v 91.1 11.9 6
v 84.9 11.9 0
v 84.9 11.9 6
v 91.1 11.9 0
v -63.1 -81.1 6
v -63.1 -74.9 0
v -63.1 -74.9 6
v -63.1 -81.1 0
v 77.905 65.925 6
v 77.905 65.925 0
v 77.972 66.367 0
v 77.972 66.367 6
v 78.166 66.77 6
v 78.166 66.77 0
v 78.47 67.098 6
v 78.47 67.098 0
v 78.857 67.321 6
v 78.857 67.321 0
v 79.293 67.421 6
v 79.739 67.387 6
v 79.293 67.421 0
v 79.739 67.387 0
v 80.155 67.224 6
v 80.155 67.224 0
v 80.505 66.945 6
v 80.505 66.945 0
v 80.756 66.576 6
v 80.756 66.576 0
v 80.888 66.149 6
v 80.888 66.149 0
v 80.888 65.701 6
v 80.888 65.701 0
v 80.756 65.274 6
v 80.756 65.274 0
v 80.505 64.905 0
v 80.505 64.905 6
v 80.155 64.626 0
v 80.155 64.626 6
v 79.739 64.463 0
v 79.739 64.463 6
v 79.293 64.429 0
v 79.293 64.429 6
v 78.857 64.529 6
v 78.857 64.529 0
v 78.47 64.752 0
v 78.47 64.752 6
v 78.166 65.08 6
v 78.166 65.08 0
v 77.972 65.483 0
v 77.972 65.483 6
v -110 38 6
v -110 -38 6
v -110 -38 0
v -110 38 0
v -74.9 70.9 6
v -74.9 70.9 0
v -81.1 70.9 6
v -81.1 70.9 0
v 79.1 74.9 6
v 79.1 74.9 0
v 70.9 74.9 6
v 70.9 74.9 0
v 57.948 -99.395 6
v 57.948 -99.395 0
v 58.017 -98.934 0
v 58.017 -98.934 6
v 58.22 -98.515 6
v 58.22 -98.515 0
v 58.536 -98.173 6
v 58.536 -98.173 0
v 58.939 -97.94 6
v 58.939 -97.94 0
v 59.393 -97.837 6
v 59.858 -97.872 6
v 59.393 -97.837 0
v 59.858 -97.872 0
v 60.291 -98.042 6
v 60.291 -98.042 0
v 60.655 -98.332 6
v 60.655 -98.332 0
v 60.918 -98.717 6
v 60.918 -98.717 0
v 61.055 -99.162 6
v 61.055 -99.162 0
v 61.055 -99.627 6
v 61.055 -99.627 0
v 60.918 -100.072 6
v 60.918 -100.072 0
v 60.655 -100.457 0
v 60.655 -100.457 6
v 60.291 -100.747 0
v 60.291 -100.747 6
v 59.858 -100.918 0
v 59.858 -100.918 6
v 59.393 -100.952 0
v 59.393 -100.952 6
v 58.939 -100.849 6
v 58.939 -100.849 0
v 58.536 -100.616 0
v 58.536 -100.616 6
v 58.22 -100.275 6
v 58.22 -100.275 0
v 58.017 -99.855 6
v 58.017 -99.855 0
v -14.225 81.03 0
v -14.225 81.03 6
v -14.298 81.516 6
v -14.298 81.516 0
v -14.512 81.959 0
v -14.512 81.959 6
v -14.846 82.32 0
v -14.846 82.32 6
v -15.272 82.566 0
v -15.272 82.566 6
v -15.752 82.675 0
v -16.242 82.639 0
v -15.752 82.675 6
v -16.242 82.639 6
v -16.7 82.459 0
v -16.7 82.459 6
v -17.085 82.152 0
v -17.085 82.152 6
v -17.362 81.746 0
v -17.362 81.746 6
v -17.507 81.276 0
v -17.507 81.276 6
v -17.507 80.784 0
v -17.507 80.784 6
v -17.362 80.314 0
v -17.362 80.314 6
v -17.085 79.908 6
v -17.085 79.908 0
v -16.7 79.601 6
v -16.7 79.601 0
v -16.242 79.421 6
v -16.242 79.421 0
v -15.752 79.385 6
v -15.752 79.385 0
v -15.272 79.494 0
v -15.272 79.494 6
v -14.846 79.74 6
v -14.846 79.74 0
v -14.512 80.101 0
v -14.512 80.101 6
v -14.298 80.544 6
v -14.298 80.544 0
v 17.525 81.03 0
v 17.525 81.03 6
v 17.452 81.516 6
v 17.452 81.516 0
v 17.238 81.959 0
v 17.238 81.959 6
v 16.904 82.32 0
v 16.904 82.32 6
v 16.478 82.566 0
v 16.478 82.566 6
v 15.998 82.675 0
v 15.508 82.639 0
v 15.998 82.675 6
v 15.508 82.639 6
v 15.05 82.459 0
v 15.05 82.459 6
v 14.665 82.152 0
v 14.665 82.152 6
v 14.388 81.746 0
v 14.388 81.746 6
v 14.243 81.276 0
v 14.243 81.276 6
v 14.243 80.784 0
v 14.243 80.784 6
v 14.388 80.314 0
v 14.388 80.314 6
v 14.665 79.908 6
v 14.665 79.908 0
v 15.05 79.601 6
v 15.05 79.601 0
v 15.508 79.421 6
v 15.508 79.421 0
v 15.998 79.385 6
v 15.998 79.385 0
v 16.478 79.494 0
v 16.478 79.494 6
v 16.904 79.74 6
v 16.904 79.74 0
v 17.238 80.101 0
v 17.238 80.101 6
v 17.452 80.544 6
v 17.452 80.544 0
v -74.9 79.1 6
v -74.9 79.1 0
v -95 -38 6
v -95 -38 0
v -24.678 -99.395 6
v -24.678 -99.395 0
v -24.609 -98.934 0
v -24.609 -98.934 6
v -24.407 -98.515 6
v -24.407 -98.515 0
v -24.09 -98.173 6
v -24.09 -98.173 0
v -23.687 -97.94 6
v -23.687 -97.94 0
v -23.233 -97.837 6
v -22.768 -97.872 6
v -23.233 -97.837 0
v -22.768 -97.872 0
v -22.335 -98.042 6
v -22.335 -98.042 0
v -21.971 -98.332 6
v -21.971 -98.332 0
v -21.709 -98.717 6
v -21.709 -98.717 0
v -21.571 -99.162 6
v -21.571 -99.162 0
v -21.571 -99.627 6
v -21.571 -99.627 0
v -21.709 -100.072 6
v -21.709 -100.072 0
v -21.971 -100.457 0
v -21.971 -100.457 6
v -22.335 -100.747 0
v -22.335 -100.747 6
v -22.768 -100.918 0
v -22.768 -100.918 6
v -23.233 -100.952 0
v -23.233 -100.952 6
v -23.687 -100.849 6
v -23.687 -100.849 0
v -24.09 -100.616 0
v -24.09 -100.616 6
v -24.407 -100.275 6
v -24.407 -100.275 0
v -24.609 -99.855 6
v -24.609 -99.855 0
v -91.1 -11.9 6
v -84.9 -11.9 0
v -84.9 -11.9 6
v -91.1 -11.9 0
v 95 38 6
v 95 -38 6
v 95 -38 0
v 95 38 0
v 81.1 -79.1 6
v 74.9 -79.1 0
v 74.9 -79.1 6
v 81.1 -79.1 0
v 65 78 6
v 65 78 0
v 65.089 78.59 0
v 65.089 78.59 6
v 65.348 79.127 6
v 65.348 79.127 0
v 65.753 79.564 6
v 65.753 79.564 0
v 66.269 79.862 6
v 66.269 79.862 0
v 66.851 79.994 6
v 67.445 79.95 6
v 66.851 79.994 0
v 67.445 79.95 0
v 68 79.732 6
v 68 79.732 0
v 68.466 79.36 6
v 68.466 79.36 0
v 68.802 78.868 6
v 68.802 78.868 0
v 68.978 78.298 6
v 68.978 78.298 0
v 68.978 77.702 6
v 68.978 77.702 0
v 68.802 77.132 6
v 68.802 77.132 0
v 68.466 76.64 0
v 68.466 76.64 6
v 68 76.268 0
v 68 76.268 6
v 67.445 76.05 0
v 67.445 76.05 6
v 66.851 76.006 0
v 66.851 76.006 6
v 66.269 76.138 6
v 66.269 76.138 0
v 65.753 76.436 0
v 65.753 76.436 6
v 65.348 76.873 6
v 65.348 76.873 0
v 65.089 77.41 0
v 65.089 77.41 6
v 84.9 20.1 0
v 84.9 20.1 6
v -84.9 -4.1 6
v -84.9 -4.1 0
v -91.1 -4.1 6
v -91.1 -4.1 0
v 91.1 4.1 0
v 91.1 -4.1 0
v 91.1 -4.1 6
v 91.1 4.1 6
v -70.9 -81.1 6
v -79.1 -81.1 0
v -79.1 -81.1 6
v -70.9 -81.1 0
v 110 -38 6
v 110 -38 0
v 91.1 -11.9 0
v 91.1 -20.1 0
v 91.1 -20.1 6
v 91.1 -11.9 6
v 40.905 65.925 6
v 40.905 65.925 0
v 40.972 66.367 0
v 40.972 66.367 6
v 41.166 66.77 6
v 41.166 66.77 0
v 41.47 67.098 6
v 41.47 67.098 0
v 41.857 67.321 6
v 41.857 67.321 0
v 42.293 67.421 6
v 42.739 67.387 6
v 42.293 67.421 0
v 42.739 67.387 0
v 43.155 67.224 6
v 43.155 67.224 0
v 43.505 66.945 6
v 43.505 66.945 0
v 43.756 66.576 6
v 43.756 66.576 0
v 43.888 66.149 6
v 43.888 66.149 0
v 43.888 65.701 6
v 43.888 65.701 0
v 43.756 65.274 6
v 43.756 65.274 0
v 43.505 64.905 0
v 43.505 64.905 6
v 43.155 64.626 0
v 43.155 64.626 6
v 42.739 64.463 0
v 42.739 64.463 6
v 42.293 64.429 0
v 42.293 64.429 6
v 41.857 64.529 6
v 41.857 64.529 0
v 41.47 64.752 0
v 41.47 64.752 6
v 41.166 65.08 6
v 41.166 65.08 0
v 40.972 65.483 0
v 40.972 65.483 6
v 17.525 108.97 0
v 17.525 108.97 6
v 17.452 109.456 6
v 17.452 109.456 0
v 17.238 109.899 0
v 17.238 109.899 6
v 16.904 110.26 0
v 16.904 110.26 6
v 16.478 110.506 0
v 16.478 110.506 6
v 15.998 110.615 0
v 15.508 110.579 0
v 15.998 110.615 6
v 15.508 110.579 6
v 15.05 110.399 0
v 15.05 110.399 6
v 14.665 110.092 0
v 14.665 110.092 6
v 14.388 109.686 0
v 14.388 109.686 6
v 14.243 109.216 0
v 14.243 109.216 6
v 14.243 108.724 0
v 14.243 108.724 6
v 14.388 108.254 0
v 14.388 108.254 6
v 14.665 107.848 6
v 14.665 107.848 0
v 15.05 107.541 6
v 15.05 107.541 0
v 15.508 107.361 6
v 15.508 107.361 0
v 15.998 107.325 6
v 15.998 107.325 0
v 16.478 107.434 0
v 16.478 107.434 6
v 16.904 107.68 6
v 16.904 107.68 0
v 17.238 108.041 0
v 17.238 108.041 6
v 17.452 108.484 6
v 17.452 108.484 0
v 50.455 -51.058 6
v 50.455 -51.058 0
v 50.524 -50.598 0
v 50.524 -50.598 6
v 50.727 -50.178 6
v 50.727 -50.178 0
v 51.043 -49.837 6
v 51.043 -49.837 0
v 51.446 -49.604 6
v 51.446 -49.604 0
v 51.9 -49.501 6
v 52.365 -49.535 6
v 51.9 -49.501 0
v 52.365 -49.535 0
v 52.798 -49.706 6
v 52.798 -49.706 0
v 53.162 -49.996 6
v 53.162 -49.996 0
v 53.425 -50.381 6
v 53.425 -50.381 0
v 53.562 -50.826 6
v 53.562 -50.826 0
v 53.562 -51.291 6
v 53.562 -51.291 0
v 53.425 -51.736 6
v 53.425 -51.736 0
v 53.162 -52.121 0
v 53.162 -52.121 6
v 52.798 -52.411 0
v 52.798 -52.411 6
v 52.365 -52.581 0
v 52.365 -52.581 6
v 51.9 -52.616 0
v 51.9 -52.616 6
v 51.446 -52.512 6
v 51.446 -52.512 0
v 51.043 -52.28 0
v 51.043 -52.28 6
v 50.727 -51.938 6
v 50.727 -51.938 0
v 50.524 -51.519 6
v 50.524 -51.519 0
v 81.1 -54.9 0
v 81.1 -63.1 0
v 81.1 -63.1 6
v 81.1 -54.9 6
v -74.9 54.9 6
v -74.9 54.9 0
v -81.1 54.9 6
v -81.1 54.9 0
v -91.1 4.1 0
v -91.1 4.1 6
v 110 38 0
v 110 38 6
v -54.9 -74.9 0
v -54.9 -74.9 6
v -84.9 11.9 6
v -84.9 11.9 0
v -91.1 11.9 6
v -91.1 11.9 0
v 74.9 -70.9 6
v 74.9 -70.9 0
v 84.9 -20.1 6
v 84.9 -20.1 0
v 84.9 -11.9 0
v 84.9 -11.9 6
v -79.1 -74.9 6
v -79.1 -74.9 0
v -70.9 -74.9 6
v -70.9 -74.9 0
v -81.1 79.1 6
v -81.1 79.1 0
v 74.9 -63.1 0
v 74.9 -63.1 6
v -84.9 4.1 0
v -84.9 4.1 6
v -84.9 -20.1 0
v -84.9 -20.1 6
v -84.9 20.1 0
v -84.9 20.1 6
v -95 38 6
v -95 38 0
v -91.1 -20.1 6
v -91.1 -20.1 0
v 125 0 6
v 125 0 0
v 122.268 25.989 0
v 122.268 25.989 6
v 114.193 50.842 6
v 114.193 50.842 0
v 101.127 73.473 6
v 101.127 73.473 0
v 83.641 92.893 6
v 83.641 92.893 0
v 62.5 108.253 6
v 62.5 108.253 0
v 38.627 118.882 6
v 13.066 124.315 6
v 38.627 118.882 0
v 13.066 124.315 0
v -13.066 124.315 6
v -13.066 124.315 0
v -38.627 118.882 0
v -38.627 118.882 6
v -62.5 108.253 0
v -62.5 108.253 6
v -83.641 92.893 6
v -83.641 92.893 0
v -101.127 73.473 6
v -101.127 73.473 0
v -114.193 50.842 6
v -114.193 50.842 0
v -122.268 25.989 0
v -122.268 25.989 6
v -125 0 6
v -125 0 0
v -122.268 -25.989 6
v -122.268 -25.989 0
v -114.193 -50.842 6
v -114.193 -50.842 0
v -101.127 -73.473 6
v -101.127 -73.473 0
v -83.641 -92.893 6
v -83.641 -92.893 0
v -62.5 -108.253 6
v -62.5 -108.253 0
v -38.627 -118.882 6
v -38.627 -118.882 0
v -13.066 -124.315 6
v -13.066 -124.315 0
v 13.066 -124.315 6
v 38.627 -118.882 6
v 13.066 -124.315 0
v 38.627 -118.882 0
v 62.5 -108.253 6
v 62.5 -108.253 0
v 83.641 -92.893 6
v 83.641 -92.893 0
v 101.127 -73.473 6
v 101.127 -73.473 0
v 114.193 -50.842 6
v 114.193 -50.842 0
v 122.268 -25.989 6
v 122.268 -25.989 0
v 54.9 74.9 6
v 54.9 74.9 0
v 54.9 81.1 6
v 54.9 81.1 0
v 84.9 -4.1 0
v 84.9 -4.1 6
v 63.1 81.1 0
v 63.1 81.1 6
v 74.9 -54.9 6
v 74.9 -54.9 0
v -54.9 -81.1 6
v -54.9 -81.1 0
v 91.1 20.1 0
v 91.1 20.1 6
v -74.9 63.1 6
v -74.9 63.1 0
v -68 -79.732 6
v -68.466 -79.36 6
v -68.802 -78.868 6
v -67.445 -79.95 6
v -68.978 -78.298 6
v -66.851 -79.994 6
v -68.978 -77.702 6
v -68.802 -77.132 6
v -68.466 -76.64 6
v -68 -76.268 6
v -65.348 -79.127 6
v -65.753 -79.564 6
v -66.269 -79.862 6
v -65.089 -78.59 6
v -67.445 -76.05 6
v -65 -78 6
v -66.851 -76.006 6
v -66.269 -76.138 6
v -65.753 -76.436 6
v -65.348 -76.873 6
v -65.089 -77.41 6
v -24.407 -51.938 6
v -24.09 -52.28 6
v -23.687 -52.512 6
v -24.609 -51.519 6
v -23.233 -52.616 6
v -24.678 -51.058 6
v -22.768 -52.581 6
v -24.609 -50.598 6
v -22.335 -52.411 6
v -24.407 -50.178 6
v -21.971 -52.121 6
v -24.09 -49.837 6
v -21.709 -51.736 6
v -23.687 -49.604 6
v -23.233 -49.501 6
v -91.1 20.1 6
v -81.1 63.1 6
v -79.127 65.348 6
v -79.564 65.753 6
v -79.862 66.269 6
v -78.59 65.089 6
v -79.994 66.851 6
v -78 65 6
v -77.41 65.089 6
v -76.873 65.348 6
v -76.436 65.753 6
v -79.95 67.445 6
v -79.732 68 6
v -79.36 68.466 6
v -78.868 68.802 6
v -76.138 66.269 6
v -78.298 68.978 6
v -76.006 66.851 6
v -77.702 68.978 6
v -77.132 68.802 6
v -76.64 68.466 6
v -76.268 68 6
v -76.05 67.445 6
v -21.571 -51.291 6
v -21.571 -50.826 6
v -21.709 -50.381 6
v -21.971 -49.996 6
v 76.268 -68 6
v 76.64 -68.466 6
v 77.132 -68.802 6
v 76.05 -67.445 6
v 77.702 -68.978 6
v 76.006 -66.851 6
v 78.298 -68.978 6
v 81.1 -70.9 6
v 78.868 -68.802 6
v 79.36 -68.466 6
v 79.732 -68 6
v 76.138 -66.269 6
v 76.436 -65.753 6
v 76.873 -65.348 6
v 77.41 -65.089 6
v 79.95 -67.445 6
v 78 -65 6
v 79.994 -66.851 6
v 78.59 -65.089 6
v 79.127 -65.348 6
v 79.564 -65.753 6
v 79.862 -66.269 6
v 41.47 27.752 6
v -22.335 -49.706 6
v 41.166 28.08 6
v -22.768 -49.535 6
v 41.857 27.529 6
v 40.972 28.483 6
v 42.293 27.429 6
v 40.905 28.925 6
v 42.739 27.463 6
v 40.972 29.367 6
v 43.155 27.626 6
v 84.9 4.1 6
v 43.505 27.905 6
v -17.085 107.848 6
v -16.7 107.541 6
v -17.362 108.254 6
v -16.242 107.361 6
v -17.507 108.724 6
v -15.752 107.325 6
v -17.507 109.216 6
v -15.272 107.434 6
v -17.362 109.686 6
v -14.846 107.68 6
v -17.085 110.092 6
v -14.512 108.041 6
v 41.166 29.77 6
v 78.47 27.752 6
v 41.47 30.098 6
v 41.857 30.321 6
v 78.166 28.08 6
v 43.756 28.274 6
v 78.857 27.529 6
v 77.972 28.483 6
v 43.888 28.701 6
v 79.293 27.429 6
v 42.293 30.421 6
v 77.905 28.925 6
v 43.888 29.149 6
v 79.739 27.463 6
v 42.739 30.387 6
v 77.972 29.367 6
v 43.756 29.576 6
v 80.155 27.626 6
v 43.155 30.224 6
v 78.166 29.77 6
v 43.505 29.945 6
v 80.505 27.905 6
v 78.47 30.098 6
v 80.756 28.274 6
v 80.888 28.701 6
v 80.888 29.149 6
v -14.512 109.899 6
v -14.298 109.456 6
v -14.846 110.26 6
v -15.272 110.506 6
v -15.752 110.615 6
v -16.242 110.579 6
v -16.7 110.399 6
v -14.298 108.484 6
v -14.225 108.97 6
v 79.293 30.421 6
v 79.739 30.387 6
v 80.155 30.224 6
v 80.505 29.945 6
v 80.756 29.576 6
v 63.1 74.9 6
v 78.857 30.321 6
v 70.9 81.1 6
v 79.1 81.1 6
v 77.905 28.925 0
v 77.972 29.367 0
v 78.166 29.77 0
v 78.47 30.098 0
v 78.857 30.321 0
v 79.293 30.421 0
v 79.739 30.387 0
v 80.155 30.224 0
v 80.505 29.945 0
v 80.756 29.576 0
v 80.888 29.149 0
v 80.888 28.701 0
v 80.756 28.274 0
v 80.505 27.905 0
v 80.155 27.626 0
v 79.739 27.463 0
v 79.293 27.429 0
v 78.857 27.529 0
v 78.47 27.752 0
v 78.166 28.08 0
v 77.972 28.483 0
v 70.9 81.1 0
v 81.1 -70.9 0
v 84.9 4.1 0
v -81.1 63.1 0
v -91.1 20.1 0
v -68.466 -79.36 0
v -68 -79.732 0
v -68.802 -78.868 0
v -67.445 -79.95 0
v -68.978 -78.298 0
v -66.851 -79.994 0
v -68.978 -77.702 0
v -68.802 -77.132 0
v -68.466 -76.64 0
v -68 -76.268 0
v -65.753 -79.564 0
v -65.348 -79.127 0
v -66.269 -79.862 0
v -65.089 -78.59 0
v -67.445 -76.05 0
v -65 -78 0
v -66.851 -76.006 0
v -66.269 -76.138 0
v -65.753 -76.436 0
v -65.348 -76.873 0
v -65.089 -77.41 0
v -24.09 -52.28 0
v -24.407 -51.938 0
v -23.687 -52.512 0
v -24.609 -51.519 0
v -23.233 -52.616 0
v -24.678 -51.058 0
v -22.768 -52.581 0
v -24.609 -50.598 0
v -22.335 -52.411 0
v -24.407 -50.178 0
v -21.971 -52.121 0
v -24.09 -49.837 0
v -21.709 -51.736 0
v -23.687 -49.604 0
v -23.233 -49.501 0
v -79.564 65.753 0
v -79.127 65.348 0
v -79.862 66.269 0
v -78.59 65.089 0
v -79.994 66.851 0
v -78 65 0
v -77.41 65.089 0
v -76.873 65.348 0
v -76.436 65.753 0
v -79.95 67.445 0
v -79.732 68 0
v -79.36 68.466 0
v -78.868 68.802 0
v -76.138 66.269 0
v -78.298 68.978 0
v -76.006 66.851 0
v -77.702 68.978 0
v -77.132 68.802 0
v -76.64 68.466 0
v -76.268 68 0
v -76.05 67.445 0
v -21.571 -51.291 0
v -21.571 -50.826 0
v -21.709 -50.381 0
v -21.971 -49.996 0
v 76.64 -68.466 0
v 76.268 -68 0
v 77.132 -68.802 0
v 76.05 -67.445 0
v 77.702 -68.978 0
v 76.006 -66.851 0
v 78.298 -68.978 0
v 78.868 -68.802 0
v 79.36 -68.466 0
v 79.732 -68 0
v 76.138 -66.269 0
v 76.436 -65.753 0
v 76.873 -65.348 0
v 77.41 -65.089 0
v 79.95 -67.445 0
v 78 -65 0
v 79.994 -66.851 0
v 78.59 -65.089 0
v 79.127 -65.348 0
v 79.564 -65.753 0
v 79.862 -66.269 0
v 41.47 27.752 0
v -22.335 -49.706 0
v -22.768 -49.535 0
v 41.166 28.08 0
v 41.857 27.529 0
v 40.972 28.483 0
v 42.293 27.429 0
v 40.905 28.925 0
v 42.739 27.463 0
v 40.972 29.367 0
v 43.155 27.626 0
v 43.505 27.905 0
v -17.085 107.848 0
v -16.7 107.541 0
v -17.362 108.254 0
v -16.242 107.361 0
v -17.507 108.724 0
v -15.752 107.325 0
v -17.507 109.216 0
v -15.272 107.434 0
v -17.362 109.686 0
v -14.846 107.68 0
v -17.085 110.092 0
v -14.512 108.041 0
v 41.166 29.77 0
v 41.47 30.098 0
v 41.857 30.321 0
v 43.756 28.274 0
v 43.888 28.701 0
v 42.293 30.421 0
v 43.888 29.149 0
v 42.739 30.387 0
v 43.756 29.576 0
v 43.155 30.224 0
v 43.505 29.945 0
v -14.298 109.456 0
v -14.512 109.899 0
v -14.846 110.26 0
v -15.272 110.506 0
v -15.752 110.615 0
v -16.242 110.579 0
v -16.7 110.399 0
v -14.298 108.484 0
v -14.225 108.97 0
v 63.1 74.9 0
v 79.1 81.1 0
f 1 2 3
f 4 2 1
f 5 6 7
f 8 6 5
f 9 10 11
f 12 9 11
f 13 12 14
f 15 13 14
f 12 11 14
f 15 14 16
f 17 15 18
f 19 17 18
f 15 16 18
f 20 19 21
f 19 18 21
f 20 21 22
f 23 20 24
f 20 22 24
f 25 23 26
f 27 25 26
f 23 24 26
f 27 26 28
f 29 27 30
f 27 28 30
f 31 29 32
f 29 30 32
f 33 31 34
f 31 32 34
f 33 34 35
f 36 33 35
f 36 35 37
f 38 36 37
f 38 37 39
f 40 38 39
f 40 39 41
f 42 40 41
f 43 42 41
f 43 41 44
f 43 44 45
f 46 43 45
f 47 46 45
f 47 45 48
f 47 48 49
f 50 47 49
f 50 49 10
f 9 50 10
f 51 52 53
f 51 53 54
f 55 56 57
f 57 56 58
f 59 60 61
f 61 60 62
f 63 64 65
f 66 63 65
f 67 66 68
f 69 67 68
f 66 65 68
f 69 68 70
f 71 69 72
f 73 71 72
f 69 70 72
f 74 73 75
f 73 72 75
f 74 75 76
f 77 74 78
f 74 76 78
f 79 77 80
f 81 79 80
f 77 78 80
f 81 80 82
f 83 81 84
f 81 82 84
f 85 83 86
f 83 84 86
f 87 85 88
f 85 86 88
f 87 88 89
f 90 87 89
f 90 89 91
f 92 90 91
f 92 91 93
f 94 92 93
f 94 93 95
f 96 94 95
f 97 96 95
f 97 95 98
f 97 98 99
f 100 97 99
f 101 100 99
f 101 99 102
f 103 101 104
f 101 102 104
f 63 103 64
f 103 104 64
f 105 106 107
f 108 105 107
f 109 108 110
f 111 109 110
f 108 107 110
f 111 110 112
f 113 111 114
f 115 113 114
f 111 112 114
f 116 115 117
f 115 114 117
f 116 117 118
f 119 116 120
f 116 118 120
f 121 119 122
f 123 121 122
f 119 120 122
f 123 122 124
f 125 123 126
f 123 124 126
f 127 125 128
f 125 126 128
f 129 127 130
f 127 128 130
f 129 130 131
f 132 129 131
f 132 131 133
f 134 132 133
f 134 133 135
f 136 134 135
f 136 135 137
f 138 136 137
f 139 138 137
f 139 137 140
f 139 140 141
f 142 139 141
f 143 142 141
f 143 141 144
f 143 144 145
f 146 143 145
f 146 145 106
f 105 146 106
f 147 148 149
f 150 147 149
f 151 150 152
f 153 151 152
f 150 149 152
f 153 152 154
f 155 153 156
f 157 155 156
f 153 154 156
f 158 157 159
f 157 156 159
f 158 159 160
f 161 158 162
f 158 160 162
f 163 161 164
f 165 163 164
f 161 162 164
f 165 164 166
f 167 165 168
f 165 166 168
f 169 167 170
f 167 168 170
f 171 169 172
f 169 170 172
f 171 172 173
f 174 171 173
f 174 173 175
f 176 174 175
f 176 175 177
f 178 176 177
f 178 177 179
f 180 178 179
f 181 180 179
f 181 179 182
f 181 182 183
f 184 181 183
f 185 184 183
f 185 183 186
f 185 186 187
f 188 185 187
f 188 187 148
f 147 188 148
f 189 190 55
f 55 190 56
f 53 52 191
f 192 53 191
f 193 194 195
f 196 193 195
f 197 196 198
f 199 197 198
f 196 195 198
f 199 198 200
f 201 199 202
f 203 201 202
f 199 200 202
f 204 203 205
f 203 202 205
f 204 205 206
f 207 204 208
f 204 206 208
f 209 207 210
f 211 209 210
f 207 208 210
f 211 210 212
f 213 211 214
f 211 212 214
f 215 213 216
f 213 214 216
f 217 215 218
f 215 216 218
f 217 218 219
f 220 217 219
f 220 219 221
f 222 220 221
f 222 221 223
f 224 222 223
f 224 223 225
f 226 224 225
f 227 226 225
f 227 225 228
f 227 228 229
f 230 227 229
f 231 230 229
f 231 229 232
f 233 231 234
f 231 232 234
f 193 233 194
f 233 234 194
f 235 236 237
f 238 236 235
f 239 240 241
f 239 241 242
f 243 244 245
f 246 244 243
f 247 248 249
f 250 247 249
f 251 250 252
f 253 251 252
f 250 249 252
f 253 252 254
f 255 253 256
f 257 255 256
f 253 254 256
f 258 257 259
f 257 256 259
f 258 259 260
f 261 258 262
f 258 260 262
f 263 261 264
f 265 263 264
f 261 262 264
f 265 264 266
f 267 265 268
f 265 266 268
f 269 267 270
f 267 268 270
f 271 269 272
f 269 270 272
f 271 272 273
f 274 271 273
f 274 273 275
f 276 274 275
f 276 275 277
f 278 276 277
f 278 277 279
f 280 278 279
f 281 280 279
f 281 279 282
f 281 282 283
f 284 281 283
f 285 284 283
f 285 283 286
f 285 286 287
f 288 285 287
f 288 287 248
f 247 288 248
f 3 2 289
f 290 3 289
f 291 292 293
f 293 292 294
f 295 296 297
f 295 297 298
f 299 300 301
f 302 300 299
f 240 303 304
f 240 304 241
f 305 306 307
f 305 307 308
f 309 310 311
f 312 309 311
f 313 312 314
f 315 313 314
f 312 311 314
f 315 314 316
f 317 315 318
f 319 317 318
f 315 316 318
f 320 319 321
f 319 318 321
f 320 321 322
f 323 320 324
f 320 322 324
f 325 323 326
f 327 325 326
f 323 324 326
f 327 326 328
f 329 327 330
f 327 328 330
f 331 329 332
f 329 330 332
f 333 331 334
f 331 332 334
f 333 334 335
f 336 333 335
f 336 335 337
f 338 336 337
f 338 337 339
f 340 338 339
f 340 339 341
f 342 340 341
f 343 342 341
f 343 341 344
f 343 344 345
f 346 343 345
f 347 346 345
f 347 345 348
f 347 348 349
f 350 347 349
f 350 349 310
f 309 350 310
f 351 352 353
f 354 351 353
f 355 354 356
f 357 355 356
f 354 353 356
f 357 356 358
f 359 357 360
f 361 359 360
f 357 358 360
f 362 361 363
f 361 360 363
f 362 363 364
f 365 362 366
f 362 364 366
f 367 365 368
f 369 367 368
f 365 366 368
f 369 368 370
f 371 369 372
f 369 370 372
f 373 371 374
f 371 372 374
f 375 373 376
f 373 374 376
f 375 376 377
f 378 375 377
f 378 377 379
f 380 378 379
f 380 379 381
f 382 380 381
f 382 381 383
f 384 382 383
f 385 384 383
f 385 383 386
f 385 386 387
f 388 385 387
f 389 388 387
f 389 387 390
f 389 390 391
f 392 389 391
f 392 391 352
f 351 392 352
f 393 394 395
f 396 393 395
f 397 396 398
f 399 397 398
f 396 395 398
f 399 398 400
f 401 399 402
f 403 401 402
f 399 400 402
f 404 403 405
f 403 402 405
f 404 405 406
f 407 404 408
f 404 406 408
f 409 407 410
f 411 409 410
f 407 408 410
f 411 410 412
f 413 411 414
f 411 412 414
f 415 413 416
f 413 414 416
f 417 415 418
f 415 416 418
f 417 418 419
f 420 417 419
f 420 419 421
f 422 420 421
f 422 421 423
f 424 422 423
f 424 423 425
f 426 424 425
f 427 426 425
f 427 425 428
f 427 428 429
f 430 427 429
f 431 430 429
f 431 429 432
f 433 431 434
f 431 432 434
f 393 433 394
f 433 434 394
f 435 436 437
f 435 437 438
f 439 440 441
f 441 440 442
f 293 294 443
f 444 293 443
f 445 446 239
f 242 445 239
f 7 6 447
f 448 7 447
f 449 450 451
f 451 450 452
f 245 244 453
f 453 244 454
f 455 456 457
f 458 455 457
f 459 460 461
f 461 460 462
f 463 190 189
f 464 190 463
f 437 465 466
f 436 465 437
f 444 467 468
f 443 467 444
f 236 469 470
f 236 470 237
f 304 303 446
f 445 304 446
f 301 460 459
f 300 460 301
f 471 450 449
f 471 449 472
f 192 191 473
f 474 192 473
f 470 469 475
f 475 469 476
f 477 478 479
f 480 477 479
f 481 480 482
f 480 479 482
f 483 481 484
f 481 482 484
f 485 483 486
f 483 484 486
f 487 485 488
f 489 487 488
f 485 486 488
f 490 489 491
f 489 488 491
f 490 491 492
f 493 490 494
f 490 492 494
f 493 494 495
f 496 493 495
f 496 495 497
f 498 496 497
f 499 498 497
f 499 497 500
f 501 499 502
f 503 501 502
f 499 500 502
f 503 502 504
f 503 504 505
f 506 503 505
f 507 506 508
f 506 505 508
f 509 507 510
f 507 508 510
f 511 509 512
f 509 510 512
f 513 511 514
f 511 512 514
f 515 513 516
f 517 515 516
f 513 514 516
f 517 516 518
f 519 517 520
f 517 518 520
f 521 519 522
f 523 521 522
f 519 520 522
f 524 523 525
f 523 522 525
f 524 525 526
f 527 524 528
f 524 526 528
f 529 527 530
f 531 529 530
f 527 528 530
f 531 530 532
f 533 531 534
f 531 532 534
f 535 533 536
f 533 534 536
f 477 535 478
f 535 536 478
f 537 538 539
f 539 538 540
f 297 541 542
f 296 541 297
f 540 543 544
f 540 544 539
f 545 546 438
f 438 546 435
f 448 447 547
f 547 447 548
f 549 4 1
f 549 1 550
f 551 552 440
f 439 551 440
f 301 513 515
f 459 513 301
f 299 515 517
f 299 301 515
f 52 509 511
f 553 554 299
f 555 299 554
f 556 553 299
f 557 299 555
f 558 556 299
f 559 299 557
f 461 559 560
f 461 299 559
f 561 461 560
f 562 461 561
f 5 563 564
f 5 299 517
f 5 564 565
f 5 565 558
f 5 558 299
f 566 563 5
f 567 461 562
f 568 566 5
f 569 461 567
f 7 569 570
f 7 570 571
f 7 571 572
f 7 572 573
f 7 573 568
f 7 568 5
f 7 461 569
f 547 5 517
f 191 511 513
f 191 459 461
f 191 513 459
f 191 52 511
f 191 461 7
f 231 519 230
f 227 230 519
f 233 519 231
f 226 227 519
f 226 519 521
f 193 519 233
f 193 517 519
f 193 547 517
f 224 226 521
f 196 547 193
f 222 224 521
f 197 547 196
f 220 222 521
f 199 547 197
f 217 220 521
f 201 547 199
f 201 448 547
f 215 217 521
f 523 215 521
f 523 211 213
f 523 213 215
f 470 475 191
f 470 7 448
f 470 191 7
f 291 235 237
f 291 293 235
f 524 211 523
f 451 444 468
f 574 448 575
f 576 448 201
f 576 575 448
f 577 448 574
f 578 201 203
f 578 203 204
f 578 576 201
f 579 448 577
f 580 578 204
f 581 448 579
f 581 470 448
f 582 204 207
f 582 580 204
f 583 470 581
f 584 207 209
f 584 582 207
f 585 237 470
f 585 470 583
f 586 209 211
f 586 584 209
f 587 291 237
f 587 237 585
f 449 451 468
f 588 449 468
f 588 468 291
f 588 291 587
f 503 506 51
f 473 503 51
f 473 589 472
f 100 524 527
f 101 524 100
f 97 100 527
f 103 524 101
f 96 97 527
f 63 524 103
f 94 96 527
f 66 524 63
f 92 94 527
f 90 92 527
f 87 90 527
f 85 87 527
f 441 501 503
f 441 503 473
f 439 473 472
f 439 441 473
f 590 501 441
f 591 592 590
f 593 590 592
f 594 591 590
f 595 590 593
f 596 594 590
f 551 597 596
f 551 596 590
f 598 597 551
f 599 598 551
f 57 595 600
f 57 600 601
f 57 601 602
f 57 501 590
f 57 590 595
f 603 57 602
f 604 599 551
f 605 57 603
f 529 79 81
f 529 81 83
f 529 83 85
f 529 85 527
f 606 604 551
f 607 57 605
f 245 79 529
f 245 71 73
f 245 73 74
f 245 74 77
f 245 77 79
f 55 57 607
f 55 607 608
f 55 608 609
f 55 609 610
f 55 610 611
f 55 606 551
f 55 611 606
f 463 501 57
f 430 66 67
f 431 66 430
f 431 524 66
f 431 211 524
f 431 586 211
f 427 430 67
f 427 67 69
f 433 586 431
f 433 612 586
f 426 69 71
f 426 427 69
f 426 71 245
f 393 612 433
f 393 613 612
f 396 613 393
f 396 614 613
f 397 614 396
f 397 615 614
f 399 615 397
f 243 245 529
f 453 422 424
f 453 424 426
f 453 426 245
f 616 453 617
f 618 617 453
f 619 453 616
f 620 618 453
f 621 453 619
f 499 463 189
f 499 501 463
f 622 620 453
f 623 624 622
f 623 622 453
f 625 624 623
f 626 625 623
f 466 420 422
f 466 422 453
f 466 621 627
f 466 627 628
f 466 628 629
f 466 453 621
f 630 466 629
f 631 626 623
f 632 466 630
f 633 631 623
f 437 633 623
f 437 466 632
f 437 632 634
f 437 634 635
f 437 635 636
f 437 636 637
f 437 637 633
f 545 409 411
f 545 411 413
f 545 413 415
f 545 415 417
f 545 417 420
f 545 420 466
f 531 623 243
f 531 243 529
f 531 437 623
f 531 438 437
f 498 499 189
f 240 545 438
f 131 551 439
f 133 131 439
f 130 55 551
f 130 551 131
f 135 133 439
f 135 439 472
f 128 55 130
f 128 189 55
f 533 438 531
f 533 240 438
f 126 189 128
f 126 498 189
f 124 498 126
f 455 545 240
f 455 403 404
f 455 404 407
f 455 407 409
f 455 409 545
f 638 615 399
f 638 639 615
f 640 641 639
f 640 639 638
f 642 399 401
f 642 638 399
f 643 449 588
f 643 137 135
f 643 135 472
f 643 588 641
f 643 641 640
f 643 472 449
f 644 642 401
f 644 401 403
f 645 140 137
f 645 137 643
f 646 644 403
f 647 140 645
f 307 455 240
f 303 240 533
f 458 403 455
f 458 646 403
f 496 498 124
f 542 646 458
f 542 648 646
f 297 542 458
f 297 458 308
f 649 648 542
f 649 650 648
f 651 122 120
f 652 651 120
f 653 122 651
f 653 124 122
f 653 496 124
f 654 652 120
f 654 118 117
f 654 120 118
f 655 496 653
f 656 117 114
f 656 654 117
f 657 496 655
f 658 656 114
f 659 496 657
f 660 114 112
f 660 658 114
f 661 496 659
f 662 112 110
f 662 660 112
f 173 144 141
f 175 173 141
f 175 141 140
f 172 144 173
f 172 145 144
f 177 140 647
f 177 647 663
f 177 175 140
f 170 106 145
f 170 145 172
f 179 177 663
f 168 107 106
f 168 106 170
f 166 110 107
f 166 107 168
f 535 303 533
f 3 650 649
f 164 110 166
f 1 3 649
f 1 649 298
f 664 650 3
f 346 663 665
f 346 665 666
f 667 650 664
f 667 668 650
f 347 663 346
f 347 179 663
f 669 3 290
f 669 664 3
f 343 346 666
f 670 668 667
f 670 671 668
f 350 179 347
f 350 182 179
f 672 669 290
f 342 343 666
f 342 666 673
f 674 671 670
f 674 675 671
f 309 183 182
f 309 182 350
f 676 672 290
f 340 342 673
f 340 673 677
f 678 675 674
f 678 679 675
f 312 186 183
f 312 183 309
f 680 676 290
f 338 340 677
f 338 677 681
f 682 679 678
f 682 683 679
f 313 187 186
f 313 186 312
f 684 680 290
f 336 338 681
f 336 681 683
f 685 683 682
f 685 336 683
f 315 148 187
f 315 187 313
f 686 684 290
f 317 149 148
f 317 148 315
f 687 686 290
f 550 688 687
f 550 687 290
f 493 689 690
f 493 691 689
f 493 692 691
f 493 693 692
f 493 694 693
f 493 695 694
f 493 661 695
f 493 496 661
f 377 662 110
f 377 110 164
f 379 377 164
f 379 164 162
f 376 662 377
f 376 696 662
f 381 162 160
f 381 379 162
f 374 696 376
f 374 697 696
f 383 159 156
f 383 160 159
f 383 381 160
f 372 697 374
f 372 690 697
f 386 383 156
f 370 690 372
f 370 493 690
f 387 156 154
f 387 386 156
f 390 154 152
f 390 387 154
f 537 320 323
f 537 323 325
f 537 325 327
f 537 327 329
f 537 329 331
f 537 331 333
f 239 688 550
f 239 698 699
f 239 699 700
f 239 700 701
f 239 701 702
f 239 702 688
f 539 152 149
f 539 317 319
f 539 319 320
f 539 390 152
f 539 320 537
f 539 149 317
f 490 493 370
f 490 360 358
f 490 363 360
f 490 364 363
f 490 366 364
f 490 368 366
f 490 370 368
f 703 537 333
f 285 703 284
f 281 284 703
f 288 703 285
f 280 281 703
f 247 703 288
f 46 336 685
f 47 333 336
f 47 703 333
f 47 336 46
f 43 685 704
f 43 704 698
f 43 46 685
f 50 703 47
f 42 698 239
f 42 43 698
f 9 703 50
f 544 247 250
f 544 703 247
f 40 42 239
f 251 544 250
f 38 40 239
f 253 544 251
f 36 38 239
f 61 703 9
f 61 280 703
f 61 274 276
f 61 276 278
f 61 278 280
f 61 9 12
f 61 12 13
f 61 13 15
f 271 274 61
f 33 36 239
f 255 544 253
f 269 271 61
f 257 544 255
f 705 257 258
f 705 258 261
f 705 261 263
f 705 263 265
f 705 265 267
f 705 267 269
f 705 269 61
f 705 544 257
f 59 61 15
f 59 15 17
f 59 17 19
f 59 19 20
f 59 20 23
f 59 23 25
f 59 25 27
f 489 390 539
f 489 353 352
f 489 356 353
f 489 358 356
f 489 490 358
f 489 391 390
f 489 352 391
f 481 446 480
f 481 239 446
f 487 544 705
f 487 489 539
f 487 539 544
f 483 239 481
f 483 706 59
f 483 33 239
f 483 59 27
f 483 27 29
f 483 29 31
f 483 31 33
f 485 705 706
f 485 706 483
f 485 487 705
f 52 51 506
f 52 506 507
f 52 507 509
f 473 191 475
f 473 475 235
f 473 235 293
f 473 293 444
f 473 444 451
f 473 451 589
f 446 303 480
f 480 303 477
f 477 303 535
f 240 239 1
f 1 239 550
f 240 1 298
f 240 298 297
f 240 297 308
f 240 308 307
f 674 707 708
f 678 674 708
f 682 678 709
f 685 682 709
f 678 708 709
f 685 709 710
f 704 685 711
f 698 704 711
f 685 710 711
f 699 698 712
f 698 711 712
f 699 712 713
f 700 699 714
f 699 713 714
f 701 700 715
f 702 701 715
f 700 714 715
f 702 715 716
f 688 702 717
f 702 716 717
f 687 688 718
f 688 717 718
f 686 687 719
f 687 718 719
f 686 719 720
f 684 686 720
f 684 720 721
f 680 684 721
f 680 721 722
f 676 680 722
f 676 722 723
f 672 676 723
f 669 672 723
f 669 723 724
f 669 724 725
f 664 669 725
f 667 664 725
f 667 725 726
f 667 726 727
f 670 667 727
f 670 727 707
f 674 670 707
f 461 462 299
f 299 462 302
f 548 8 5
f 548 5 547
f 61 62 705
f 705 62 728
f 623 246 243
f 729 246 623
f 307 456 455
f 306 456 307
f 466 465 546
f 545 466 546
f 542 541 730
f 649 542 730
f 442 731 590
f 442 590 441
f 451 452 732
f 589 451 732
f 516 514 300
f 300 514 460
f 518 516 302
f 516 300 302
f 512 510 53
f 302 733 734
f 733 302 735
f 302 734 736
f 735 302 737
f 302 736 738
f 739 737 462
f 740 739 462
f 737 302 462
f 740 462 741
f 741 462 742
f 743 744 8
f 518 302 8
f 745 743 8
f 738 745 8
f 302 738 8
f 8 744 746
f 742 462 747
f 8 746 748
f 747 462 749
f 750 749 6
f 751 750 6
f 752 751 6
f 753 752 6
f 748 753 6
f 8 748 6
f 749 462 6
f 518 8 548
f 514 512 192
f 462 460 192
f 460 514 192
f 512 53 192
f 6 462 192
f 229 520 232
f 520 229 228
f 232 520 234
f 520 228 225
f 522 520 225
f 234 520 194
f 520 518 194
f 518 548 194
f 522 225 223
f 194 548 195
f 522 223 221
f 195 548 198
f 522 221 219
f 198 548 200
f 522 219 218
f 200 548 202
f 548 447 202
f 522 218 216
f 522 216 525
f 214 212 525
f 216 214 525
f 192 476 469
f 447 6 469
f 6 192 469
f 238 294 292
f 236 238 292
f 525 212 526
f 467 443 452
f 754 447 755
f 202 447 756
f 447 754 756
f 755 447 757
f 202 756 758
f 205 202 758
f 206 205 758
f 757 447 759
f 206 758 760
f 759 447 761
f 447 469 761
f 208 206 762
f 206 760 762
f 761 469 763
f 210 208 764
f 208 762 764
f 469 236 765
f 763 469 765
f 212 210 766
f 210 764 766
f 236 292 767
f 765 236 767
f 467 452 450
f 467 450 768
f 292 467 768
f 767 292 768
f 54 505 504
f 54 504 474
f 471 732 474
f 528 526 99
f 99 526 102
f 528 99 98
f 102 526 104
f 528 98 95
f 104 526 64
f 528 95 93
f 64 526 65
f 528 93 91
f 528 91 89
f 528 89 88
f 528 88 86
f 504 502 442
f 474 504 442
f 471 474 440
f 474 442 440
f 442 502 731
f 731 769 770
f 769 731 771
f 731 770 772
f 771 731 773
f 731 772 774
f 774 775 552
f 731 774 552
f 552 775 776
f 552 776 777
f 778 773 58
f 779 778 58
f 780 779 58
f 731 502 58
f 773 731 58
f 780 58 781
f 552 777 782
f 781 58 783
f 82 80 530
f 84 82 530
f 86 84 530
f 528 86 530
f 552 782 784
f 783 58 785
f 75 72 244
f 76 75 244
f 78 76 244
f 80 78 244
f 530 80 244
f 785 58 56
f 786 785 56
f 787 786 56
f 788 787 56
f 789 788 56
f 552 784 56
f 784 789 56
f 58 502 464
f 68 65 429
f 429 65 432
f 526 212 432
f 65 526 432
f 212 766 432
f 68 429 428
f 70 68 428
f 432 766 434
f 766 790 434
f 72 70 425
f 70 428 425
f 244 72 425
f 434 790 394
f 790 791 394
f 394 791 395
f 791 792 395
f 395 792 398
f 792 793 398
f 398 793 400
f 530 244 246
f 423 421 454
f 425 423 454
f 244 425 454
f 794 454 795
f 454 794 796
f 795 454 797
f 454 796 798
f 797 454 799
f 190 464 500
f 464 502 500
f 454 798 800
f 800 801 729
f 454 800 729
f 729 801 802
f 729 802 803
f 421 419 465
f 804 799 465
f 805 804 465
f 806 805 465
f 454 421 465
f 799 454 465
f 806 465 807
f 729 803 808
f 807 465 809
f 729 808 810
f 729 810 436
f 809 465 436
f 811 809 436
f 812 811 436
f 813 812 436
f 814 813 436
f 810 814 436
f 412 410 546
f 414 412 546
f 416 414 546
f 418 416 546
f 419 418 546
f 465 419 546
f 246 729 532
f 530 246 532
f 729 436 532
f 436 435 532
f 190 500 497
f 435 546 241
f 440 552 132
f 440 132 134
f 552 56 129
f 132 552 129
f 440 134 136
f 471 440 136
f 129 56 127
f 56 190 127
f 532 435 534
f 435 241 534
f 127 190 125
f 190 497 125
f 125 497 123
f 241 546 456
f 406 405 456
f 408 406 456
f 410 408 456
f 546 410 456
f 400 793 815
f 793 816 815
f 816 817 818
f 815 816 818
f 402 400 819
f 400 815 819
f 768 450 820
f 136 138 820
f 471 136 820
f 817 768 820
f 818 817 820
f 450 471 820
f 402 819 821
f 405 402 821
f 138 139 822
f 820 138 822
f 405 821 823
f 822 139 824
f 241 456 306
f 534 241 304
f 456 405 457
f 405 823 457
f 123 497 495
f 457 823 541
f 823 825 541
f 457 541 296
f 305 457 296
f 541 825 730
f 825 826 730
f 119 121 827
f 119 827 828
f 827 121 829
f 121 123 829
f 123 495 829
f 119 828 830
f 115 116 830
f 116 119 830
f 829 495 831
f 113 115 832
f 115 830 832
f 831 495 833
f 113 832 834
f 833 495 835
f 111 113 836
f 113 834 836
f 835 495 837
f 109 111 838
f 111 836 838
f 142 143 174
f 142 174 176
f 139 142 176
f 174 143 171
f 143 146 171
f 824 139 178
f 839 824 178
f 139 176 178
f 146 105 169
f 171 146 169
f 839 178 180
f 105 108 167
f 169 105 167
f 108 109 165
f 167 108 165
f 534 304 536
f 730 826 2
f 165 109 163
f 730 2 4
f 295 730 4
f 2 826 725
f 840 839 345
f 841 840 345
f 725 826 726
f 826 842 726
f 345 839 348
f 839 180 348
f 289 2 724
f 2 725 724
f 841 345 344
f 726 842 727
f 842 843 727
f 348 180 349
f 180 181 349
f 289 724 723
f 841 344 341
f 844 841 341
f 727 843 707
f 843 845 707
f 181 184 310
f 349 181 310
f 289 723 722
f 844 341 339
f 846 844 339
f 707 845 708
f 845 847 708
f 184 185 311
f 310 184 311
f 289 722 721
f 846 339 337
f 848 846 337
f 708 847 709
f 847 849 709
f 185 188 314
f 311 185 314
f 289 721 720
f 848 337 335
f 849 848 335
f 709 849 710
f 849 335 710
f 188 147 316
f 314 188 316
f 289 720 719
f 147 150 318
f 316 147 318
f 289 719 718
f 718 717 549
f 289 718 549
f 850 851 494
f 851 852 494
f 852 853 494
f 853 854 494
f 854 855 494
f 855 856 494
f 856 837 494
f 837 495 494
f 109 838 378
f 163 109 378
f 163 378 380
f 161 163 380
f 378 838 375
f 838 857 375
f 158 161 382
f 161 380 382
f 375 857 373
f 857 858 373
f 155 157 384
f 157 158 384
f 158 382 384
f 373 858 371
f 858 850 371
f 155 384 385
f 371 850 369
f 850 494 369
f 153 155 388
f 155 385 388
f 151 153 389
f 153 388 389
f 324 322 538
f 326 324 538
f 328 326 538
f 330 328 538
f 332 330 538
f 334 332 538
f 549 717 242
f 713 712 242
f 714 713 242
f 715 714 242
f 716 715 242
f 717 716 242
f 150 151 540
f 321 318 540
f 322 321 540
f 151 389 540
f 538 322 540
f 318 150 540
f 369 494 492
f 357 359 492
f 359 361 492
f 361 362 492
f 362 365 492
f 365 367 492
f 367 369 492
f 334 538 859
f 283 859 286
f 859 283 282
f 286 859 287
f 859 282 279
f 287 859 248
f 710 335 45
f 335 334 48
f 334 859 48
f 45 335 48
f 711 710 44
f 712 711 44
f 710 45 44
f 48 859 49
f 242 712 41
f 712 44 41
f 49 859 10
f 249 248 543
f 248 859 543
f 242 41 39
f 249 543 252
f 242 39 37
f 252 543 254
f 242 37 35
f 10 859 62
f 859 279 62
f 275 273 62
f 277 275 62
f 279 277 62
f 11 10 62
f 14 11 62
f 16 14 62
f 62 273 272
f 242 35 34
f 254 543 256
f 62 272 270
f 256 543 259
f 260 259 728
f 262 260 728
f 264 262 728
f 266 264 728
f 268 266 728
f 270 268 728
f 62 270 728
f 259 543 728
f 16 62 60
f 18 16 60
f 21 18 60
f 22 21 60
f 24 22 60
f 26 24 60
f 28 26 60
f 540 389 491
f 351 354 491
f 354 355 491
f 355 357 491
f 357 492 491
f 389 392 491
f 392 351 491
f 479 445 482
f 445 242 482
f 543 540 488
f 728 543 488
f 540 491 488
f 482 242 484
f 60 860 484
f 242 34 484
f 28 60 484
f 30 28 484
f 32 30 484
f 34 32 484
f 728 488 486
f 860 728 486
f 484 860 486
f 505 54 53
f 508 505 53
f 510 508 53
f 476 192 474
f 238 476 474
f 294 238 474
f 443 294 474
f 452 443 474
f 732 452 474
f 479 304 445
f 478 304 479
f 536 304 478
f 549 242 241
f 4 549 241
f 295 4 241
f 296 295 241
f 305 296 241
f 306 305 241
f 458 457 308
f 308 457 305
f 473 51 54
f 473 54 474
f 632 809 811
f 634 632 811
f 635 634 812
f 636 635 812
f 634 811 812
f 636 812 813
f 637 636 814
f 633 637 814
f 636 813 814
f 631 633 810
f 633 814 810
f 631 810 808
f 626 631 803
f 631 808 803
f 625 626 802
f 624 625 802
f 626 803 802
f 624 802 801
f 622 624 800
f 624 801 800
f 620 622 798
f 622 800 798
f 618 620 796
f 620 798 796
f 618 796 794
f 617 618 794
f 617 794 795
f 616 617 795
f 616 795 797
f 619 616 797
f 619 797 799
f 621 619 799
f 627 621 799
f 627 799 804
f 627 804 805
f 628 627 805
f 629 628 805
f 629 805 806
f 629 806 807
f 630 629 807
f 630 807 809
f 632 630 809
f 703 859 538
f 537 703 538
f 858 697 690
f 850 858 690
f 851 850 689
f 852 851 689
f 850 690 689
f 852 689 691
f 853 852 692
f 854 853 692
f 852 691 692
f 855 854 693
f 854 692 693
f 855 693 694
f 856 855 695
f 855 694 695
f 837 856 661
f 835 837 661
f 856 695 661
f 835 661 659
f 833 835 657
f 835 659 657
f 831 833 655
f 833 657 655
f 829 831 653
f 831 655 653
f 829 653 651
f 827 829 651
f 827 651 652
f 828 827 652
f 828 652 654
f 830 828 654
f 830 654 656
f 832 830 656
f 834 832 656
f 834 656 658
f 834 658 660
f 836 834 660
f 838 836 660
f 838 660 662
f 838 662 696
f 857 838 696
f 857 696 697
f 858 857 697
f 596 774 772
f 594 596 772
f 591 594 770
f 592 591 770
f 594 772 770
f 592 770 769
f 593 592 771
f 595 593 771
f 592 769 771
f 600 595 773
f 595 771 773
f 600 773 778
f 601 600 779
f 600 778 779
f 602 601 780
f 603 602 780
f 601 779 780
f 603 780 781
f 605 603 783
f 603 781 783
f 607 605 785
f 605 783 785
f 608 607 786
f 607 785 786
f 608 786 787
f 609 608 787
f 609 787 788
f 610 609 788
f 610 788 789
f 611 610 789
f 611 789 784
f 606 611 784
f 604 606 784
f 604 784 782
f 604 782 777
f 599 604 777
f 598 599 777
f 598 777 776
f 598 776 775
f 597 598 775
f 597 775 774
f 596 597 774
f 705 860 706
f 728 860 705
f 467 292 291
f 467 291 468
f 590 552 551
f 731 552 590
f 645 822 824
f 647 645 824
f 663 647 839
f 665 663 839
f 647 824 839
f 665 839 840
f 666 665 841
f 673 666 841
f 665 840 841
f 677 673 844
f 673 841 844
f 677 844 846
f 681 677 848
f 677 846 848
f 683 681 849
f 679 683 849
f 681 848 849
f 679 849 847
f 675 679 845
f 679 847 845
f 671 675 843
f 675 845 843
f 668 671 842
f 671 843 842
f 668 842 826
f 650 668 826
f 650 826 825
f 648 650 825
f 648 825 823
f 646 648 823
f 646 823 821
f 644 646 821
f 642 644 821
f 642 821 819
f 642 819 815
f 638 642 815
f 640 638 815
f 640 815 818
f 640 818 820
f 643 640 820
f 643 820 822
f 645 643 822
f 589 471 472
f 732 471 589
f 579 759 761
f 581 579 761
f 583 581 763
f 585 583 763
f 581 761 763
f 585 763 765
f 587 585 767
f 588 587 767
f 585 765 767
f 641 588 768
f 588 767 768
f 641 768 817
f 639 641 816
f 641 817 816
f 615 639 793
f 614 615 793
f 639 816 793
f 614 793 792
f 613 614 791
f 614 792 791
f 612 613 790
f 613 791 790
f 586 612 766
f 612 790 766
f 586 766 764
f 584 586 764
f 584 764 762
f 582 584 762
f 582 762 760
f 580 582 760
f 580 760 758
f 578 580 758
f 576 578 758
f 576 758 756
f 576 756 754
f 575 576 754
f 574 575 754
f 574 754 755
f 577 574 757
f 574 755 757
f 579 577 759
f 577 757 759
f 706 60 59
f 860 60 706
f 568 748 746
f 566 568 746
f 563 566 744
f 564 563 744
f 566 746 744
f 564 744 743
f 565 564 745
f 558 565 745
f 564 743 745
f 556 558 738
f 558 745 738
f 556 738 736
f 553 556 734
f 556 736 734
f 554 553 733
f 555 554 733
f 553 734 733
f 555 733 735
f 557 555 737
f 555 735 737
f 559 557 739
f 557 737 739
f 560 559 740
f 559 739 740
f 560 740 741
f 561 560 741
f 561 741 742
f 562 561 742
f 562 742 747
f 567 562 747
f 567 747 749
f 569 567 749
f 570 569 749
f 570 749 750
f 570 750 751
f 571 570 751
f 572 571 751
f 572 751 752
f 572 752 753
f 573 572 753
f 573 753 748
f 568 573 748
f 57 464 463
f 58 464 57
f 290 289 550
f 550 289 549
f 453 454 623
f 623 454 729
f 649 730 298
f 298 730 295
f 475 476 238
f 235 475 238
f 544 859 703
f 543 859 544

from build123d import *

# Parameters (mm, degrees)
ESQUISSE1_R                  = 125
BOSS_EXTRU_1_DEPTH           = 6
ESQUISSE2_W                  = 15
ESQUISSE2_H                  = 76
ENL_V_MAT_EXTRU_1_DEPTH      = 177.878489365
ESQUISSE3_R                  = 2
ESQUISSE3_W                  = 8.2
ESQUISSE3_H                  = 6.2
ENL_V_MAT_EXTRU_2_DEPTH      = 177.878489365
R_P_TITION_CIRCULAIRE1_COUNT = 4
ESQUISSE4_W                  = 6.2
ESQUISSE4_H                  = 8.2
ENL_V_MAT_EXTRU_3_DEPTH      = 177.878489365
ESQUISSE7_R                  = 1.5621
ENL_V_MAT_EXTRU_6_DEPTH      = 6
ESQUISSE8_R                  = 1.5
ENL_V_MAT_EXTRU_7_DEPTH      = 10
ENL_V_MAT_EXTRU_8_REACH      = 178.878
ESQUISSE9_R                  = 1.65


with BuildPart() as part:
    # Esquisse1 → Boss.-Extru.1 (new body)
    with BuildSketch(Plane.XY):
        Circle(ESQUISSE1_R)
    extrude(amount=BOSS_EXTRU_1_DEPTH)

    # Esquisse2 → Enlèv. mat.-Extru.1 (cut, through all)
    with BuildSketch(Plane.XY.offset(6)):
        with Locations((-102.5, 0)):
            Rectangle(ESQUISSE2_W, ESQUISSE2_H)
    enl_v_mat_extru_1 = extrude(amount=-ENL_V_MAT_EXTRU_1_DEPTH, mode=Mode.SUBTRACT)

    # Symétrie1: Enlèv. mat.-Extru.1 across plane
    add(enl_v_mat_extru_1.mirror(Plane(origin=(0, 0, 0), x_dir=(0, 0, 1), z_dir=(1, 0, 0))), mode=Mode.SUBTRACT)

    # Esquisse3 → Enlèv. mat.-Extru.2 (cut, through all)
    with BuildSketch(Plane(origin=(0, 0, 0), x_dir=(-1, 0, 0), z_dir=(0, 0, -1))):
        with Locations((-67, 78)):
            Circle(ESQUISSE3_R)
        with Locations((-75, 78)):
            Rectangle(ESQUISSE3_W, ESQUISSE3_H)
        with Locations((-59, 78)):
            Rectangle(ESQUISSE3_W, ESQUISSE3_H)
    enl_v_mat_extru_2 = extrude(amount=-ENL_V_MAT_EXTRU_2_DEPTH, mode=Mode.SUBTRACT)

    # Répétition circulaire1: Enlèv. mat.-Extru.2 ×4 about axis
    r_p_tition_circulaire1_axis = Axis((0, 0, -0.25), (0, 0, 1))
    for i in range(1, R_P_TITION_CIRCULAIRE1_COUNT):
        add(enl_v_mat_extru_2.rotate(r_p_tition_circulaire1_axis, i * 360 / R_P_TITION_CIRCULAIRE1_COUNT), mode=Mode.SUBTRACT)

    # Esquisse4 → Enlèv. mat.-Extru.3 (cut, through all)
    with BuildSketch(Plane(origin=(0, 0, 0), x_dir=(-1, 0, 0), z_dir=(0, 0, -1))):
        with Locations((88, 16)):
            Rectangle(ESQUISSE4_W, ESQUISSE4_H)
        with Locations((88, -16)):
            Rectangle(ESQUISSE4_W, ESQUISSE4_H)
        with Locations((88, 0)):
            Rectangle(ESQUISSE4_W, ESQUISSE4_H)
    enl_v_mat_extru_3 = extrude(amount=-ENL_V_MAT_EXTRU_3_DEPTH, mode=Mode.SUBTRACT)

    # Symétrie2: Enlèv. mat.-Extru.3 across plane
    add(enl_v_mat_extru_3.mirror(Plane(origin=(0, 0, 0), x_dir=(0, 0, 1), z_dir=(1, 0, 0))), mode=Mode.SUBTRACT)

    # Esquisse7 → Enlèv. mat.-Extru.6 (cut)
    with BuildSketch(Plane(origin=(0, 0, 0), x_dir=(-1, 0, 0), z_dir=(0, 0, -1))):
        with Locations((23.116017499, -99.394574208)):
            Circle(ESQUISSE7_R)
        with Locations((23.116017499, -51.058374208)):
            Circle(ESQUISSE7_R)
        with Locations((-52.017182501, -51.058374208)):
            Circle(ESQUISSE7_R)
        with Locations((-59.510182501, -99.394574208)):
            Circle(ESQUISSE7_R)
    extrude(amount=-ENL_V_MAT_EXTRU_6_DEPTH, mode=Mode.SUBTRACT)

    # Esquisse8 → Enlèv. mat.-Extru.7 (cut)
    with BuildSketch(Plane(origin=(0, 0, 0), x_dir=(-1, 0, 0), z_dir=(0, 0, -1))):
        with Locations((-79.404950976, 65.925052584)):
            Circle(ESQUISSE8_R)
        with Locations((-42.404950976, 65.925052584)):
            Circle(ESQUISSE8_R)
        with Locations((-42.404950976, 28.925052584)):
            Circle(ESQUISSE8_R)
        with Locations((-79.404950976, 28.925052584)):
            Circle(ESQUISSE8_R)
    extrude(amount=-ENL_V_MAT_EXTRU_7_DEPTH, mode=Mode.SUBTRACT)

    # Esquisse9 → Enlèv. mat.-Extru.8 (cut, up to next)
    with BuildSketch(Plane.XY.offset(6), mode=Mode.PRIVATE) as enl_v_mat_extru_8_sk1:
        with Locations((-15.875, 108.97)):
            Circle(ESQUISSE9_R)
    enl_v_mat_extru_8_tool1 = extrude(enl_v_mat_extru_8_sk1.sketch, amount=-ENL_V_MAT_EXTRU_8_REACH, mode=Mode.PRIVATE) & part.part
    # Esquisse9 → Enlèv. mat.-Extru.8 (cut, up to next)
    with BuildSketch(Plane.XY.offset(6), mode=Mode.PRIVATE) as enl_v_mat_extru_8_sk2:
        with Locations((15.875, 108.97)):
            Circle(ESQUISSE9_R)
    enl_v_mat_extru_8_tool2 = extrude(enl_v_mat_extru_8_sk2.sketch, amount=-ENL_V_MAT_EXTRU_8_REACH, mode=Mode.PRIVATE) & part.part
    # Esquisse9 → Enlèv. mat.-Extru.8 (cut, up to next)
    with BuildSketch(Plane.XY.offset(6), mode=Mode.PRIVATE) as enl_v_mat_extru_8_sk3:
        with Locations((15.875, 81.03)):
            Circle(ESQUISSE9_R)
    enl_v_mat_extru_8_tool3 = extrude(enl_v_mat_extru_8_sk3.sketch, amount=-ENL_V_MAT_EXTRU_8_REACH, mode=Mode.PRIVATE) & part.part
    # Esquisse9 → Enlèv. mat.-Extru.8 (cut, up to next)
    with BuildSketch(Plane.XY.offset(6), mode=Mode.PRIVATE) as enl_v_mat_extru_8_sk4:
        with Locations((-15.875, 81.03)):
            Circle(ESQUISSE9_R)
    enl_v_mat_extru_8_tool4 = extrude(enl_v_mat_extru_8_sk4.sketch, amount=-ENL_V_MAT_EXTRU_8_REACH, mode=Mode.PRIVATE) & part.part
    add(enl_v_mat_extru_8_tool1.solids().sort_by_distance((-15.875, 108.97, 6))[0], mode=Mode.SUBTRACT)
    add(enl_v_mat_extru_8_tool2.solids().sort_by_distance((15.875, 108.97, 6))[0], mode=Mode.SUBTRACT)
    add(enl_v_mat_extru_8_tool3.solids().sort_by_distance((15.875, 81.03, 6))[0], mode=Mode.SUBTRACT)
    add(enl_v_mat_extru_8_tool4.solids().sort_by_distance((-15.875, 81.03, 6))[0], mode=Mode.SUBTRACT)


solid = part.part
